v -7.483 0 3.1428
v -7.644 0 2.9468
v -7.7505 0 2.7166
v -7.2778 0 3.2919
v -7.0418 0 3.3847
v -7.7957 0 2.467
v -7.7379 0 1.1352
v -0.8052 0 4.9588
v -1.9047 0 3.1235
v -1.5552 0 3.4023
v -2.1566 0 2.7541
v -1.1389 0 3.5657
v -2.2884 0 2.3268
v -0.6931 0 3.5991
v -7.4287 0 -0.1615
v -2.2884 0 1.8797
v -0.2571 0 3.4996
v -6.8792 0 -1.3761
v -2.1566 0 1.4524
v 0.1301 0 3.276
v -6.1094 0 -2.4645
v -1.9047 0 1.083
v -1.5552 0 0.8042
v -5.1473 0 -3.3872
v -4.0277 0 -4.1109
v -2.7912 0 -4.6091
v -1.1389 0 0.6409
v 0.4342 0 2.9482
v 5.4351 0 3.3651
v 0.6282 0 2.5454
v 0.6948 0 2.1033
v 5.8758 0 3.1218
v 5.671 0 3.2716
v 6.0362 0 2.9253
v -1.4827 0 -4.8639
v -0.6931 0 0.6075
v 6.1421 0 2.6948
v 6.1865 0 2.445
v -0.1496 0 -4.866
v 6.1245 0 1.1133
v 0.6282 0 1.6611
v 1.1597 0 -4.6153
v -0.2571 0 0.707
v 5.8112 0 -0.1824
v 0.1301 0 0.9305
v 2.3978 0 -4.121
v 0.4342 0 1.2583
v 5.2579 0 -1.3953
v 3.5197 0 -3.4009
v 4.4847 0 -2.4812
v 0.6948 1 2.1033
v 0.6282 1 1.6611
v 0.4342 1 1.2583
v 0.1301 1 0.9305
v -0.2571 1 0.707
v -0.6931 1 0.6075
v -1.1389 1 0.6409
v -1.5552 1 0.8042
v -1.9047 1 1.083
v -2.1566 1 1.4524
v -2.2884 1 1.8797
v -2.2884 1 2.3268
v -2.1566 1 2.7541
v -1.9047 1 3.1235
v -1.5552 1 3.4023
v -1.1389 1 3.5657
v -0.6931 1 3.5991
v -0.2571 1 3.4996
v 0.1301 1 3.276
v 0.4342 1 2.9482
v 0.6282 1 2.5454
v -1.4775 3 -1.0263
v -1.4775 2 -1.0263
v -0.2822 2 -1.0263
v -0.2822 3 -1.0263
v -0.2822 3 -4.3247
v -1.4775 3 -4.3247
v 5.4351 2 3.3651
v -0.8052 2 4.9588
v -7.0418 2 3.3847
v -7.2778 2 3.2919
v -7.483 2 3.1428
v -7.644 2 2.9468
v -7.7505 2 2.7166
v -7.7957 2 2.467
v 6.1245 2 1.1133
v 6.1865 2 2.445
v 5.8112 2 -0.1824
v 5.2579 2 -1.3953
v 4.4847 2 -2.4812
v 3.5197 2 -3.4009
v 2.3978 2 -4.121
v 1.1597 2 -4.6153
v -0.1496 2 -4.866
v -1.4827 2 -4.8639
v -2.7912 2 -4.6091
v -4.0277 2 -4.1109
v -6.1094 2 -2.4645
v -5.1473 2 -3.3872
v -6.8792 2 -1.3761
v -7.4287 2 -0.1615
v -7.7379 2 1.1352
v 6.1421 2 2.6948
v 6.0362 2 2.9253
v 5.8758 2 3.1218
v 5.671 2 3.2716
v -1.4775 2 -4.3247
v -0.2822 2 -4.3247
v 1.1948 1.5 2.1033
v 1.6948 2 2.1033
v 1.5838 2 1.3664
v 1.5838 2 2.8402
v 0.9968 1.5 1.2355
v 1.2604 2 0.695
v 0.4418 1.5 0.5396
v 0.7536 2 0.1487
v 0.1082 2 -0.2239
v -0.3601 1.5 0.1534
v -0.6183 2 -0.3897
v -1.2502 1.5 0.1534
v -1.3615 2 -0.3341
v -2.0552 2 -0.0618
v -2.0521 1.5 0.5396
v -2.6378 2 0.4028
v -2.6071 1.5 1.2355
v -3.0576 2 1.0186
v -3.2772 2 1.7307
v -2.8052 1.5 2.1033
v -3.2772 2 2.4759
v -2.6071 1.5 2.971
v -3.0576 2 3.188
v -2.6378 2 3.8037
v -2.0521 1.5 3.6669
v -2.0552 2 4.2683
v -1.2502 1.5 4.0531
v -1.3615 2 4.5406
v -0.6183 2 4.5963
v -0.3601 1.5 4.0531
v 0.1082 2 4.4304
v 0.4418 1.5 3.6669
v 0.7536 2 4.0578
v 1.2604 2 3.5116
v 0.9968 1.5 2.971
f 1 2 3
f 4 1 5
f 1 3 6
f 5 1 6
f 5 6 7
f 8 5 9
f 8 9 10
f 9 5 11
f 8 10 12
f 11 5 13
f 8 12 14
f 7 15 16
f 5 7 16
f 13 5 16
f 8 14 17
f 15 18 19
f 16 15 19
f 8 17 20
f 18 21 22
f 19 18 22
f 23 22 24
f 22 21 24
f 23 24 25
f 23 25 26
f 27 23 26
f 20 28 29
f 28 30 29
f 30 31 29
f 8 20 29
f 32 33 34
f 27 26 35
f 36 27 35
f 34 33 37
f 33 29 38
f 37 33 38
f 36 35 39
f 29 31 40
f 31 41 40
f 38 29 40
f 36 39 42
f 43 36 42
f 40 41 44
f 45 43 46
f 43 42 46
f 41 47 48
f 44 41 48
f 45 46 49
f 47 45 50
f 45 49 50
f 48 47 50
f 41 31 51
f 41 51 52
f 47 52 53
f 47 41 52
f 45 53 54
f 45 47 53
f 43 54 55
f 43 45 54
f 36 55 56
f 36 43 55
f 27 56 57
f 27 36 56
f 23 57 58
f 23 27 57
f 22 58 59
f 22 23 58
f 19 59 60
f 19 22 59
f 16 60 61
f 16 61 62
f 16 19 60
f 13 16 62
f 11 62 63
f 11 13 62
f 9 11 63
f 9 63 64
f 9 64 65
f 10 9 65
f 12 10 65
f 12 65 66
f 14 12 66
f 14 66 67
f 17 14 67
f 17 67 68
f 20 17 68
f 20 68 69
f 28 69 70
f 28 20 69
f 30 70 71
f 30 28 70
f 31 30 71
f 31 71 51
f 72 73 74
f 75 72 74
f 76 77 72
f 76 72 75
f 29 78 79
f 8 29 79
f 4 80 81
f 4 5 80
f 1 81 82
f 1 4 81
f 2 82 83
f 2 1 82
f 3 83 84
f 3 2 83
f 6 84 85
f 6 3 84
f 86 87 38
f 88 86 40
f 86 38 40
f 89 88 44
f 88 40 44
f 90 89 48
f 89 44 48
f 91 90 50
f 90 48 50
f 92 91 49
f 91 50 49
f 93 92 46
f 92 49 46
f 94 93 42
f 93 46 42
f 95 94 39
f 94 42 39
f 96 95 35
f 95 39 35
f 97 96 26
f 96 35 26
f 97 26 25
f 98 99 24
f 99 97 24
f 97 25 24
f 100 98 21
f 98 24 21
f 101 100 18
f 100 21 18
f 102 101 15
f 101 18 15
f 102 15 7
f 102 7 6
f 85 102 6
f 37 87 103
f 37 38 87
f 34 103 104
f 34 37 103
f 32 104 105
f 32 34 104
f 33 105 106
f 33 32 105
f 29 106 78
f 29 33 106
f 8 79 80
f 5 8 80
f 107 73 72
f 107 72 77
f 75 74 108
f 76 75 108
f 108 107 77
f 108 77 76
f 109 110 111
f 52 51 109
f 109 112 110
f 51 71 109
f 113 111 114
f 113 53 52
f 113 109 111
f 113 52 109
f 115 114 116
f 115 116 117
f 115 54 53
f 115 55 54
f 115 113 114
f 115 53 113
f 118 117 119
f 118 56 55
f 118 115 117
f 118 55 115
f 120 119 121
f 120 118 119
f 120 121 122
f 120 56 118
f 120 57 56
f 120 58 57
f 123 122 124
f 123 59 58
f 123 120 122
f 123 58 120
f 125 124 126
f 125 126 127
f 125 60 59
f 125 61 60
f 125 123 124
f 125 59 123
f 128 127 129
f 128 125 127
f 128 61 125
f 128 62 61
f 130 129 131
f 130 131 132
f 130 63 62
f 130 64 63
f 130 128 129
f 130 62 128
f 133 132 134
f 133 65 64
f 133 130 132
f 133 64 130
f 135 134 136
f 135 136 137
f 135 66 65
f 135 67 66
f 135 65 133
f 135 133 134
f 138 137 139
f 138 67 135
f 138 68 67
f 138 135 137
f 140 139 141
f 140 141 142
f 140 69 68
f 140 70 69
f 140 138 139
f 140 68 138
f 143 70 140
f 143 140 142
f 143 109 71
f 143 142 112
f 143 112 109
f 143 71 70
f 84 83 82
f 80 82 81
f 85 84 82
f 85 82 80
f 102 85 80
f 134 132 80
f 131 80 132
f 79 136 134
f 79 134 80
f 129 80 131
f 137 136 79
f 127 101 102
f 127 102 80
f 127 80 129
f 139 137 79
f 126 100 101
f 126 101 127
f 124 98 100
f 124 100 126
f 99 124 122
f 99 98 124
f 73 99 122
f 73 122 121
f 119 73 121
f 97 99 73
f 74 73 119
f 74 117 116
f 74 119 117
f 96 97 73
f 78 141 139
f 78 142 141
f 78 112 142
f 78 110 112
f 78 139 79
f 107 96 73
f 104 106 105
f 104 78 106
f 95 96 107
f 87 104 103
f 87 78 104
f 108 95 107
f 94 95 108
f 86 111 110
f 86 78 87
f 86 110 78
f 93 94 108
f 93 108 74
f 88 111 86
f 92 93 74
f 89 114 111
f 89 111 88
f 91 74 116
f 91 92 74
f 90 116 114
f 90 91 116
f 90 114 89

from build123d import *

# Parameters (mm, degrees)
SKETCH1_R           = 7
SKETCH1_R_2         = 1.5
BOSS_EXTRUDE1_DEPTH = 2
SKETCH2_W           = 15.705717302
SKETCH2_H           = 4.43210583
CUT_EXTRUDE1_DEPTH  = 2
CHAMFER1_SIZE       = 1
SKETCH3_W           = 1.195235373
SKETCH3_H           = 3.298389924
BOSS_EXTRUDE2_DEPTH = 1
CUT_EXTRUDE2_DEPTH  = 5
FILLET1_R           = 1


with BuildPart() as part:
    # Sketch1 → Boss-Extrude1 (new body)
    with BuildSketch(Plane(origin=(0, 0, 0), x_dir=(1, 0, 0), z_dir=(0, 1, 0))):
        with Locations((-0.805155446, -2.103263206)):
            Circle(SKETCH1_R)
        with Locations((-0.805155446, -2.103263206)):
            Circle(SKETCH1_R_2, mode=Mode.SUBTRACT)
    extrude(amount=BOSS_EXTRUDE1_DEPTH)

    # Sketch2 → Cut-Extrude1 (cut)
    with BuildSketch(Plane(origin=(0, 2, 0), x_dir=(1, 0, 0), z_dir=(0, 1, 0))):
        with Locations((-1.273649854, -7.174901084)):
            Rectangle(SKETCH2_W, SKETCH2_H)
    extrude(amount=-CUT_EXTRUDE1_DEPTH, mode=Mode.SUBTRACT)

    # Chamfer1
    chamfer1_edges = [part.edges().sort_by_distance(p)[0] for p in [
        (-2.305155446, 2, 2.103263206),
    ]]
    chamfer(chamfer1_edges, length=CHAMFER1_SIZE)

    # Sketch3 → Boss-Extrude2 (add)
    with BuildSketch(Plane(origin=(0, 2, 0), x_dir=(1, 0, 0), z_dir=(0, 1, 0))):
        with Locations((-0.879857657, 2.675462874)):
            Rectangle(SKETCH3_W, SKETCH3_H)
    extrude(amount=BOSS_EXTRUDE2_DEPTH)

    # Sketch4 → Cut-Extrude2 (cut)
    with BuildSketch(Plane(origin=(0, 2, 0), x_dir=(1, 0, 0), z_dir=(0, 1, 0))):
        Polygon((-0.805155446, -4.958848169), (-9.111708645, -2.862197678), (-9.111708645, -6.506834359), (7.404077395, -6.506834359), (7.404077395, -2.862197678), align=None)
    extrude(amount=-CUT_EXTRUDE2_DEPTH, mode=Mode.SUBTRACT)

    # Fillet1
    fillet1_edges = [part.edges().sort_by_distance(p)[0] for p in [
        (6.109528179, 1, 3.192827507),
        (-7.716407835, 1, 3.214384447),
    ]]
    fillet(fillet1_edges, radius=FILLET1_R)


solid = part.part
